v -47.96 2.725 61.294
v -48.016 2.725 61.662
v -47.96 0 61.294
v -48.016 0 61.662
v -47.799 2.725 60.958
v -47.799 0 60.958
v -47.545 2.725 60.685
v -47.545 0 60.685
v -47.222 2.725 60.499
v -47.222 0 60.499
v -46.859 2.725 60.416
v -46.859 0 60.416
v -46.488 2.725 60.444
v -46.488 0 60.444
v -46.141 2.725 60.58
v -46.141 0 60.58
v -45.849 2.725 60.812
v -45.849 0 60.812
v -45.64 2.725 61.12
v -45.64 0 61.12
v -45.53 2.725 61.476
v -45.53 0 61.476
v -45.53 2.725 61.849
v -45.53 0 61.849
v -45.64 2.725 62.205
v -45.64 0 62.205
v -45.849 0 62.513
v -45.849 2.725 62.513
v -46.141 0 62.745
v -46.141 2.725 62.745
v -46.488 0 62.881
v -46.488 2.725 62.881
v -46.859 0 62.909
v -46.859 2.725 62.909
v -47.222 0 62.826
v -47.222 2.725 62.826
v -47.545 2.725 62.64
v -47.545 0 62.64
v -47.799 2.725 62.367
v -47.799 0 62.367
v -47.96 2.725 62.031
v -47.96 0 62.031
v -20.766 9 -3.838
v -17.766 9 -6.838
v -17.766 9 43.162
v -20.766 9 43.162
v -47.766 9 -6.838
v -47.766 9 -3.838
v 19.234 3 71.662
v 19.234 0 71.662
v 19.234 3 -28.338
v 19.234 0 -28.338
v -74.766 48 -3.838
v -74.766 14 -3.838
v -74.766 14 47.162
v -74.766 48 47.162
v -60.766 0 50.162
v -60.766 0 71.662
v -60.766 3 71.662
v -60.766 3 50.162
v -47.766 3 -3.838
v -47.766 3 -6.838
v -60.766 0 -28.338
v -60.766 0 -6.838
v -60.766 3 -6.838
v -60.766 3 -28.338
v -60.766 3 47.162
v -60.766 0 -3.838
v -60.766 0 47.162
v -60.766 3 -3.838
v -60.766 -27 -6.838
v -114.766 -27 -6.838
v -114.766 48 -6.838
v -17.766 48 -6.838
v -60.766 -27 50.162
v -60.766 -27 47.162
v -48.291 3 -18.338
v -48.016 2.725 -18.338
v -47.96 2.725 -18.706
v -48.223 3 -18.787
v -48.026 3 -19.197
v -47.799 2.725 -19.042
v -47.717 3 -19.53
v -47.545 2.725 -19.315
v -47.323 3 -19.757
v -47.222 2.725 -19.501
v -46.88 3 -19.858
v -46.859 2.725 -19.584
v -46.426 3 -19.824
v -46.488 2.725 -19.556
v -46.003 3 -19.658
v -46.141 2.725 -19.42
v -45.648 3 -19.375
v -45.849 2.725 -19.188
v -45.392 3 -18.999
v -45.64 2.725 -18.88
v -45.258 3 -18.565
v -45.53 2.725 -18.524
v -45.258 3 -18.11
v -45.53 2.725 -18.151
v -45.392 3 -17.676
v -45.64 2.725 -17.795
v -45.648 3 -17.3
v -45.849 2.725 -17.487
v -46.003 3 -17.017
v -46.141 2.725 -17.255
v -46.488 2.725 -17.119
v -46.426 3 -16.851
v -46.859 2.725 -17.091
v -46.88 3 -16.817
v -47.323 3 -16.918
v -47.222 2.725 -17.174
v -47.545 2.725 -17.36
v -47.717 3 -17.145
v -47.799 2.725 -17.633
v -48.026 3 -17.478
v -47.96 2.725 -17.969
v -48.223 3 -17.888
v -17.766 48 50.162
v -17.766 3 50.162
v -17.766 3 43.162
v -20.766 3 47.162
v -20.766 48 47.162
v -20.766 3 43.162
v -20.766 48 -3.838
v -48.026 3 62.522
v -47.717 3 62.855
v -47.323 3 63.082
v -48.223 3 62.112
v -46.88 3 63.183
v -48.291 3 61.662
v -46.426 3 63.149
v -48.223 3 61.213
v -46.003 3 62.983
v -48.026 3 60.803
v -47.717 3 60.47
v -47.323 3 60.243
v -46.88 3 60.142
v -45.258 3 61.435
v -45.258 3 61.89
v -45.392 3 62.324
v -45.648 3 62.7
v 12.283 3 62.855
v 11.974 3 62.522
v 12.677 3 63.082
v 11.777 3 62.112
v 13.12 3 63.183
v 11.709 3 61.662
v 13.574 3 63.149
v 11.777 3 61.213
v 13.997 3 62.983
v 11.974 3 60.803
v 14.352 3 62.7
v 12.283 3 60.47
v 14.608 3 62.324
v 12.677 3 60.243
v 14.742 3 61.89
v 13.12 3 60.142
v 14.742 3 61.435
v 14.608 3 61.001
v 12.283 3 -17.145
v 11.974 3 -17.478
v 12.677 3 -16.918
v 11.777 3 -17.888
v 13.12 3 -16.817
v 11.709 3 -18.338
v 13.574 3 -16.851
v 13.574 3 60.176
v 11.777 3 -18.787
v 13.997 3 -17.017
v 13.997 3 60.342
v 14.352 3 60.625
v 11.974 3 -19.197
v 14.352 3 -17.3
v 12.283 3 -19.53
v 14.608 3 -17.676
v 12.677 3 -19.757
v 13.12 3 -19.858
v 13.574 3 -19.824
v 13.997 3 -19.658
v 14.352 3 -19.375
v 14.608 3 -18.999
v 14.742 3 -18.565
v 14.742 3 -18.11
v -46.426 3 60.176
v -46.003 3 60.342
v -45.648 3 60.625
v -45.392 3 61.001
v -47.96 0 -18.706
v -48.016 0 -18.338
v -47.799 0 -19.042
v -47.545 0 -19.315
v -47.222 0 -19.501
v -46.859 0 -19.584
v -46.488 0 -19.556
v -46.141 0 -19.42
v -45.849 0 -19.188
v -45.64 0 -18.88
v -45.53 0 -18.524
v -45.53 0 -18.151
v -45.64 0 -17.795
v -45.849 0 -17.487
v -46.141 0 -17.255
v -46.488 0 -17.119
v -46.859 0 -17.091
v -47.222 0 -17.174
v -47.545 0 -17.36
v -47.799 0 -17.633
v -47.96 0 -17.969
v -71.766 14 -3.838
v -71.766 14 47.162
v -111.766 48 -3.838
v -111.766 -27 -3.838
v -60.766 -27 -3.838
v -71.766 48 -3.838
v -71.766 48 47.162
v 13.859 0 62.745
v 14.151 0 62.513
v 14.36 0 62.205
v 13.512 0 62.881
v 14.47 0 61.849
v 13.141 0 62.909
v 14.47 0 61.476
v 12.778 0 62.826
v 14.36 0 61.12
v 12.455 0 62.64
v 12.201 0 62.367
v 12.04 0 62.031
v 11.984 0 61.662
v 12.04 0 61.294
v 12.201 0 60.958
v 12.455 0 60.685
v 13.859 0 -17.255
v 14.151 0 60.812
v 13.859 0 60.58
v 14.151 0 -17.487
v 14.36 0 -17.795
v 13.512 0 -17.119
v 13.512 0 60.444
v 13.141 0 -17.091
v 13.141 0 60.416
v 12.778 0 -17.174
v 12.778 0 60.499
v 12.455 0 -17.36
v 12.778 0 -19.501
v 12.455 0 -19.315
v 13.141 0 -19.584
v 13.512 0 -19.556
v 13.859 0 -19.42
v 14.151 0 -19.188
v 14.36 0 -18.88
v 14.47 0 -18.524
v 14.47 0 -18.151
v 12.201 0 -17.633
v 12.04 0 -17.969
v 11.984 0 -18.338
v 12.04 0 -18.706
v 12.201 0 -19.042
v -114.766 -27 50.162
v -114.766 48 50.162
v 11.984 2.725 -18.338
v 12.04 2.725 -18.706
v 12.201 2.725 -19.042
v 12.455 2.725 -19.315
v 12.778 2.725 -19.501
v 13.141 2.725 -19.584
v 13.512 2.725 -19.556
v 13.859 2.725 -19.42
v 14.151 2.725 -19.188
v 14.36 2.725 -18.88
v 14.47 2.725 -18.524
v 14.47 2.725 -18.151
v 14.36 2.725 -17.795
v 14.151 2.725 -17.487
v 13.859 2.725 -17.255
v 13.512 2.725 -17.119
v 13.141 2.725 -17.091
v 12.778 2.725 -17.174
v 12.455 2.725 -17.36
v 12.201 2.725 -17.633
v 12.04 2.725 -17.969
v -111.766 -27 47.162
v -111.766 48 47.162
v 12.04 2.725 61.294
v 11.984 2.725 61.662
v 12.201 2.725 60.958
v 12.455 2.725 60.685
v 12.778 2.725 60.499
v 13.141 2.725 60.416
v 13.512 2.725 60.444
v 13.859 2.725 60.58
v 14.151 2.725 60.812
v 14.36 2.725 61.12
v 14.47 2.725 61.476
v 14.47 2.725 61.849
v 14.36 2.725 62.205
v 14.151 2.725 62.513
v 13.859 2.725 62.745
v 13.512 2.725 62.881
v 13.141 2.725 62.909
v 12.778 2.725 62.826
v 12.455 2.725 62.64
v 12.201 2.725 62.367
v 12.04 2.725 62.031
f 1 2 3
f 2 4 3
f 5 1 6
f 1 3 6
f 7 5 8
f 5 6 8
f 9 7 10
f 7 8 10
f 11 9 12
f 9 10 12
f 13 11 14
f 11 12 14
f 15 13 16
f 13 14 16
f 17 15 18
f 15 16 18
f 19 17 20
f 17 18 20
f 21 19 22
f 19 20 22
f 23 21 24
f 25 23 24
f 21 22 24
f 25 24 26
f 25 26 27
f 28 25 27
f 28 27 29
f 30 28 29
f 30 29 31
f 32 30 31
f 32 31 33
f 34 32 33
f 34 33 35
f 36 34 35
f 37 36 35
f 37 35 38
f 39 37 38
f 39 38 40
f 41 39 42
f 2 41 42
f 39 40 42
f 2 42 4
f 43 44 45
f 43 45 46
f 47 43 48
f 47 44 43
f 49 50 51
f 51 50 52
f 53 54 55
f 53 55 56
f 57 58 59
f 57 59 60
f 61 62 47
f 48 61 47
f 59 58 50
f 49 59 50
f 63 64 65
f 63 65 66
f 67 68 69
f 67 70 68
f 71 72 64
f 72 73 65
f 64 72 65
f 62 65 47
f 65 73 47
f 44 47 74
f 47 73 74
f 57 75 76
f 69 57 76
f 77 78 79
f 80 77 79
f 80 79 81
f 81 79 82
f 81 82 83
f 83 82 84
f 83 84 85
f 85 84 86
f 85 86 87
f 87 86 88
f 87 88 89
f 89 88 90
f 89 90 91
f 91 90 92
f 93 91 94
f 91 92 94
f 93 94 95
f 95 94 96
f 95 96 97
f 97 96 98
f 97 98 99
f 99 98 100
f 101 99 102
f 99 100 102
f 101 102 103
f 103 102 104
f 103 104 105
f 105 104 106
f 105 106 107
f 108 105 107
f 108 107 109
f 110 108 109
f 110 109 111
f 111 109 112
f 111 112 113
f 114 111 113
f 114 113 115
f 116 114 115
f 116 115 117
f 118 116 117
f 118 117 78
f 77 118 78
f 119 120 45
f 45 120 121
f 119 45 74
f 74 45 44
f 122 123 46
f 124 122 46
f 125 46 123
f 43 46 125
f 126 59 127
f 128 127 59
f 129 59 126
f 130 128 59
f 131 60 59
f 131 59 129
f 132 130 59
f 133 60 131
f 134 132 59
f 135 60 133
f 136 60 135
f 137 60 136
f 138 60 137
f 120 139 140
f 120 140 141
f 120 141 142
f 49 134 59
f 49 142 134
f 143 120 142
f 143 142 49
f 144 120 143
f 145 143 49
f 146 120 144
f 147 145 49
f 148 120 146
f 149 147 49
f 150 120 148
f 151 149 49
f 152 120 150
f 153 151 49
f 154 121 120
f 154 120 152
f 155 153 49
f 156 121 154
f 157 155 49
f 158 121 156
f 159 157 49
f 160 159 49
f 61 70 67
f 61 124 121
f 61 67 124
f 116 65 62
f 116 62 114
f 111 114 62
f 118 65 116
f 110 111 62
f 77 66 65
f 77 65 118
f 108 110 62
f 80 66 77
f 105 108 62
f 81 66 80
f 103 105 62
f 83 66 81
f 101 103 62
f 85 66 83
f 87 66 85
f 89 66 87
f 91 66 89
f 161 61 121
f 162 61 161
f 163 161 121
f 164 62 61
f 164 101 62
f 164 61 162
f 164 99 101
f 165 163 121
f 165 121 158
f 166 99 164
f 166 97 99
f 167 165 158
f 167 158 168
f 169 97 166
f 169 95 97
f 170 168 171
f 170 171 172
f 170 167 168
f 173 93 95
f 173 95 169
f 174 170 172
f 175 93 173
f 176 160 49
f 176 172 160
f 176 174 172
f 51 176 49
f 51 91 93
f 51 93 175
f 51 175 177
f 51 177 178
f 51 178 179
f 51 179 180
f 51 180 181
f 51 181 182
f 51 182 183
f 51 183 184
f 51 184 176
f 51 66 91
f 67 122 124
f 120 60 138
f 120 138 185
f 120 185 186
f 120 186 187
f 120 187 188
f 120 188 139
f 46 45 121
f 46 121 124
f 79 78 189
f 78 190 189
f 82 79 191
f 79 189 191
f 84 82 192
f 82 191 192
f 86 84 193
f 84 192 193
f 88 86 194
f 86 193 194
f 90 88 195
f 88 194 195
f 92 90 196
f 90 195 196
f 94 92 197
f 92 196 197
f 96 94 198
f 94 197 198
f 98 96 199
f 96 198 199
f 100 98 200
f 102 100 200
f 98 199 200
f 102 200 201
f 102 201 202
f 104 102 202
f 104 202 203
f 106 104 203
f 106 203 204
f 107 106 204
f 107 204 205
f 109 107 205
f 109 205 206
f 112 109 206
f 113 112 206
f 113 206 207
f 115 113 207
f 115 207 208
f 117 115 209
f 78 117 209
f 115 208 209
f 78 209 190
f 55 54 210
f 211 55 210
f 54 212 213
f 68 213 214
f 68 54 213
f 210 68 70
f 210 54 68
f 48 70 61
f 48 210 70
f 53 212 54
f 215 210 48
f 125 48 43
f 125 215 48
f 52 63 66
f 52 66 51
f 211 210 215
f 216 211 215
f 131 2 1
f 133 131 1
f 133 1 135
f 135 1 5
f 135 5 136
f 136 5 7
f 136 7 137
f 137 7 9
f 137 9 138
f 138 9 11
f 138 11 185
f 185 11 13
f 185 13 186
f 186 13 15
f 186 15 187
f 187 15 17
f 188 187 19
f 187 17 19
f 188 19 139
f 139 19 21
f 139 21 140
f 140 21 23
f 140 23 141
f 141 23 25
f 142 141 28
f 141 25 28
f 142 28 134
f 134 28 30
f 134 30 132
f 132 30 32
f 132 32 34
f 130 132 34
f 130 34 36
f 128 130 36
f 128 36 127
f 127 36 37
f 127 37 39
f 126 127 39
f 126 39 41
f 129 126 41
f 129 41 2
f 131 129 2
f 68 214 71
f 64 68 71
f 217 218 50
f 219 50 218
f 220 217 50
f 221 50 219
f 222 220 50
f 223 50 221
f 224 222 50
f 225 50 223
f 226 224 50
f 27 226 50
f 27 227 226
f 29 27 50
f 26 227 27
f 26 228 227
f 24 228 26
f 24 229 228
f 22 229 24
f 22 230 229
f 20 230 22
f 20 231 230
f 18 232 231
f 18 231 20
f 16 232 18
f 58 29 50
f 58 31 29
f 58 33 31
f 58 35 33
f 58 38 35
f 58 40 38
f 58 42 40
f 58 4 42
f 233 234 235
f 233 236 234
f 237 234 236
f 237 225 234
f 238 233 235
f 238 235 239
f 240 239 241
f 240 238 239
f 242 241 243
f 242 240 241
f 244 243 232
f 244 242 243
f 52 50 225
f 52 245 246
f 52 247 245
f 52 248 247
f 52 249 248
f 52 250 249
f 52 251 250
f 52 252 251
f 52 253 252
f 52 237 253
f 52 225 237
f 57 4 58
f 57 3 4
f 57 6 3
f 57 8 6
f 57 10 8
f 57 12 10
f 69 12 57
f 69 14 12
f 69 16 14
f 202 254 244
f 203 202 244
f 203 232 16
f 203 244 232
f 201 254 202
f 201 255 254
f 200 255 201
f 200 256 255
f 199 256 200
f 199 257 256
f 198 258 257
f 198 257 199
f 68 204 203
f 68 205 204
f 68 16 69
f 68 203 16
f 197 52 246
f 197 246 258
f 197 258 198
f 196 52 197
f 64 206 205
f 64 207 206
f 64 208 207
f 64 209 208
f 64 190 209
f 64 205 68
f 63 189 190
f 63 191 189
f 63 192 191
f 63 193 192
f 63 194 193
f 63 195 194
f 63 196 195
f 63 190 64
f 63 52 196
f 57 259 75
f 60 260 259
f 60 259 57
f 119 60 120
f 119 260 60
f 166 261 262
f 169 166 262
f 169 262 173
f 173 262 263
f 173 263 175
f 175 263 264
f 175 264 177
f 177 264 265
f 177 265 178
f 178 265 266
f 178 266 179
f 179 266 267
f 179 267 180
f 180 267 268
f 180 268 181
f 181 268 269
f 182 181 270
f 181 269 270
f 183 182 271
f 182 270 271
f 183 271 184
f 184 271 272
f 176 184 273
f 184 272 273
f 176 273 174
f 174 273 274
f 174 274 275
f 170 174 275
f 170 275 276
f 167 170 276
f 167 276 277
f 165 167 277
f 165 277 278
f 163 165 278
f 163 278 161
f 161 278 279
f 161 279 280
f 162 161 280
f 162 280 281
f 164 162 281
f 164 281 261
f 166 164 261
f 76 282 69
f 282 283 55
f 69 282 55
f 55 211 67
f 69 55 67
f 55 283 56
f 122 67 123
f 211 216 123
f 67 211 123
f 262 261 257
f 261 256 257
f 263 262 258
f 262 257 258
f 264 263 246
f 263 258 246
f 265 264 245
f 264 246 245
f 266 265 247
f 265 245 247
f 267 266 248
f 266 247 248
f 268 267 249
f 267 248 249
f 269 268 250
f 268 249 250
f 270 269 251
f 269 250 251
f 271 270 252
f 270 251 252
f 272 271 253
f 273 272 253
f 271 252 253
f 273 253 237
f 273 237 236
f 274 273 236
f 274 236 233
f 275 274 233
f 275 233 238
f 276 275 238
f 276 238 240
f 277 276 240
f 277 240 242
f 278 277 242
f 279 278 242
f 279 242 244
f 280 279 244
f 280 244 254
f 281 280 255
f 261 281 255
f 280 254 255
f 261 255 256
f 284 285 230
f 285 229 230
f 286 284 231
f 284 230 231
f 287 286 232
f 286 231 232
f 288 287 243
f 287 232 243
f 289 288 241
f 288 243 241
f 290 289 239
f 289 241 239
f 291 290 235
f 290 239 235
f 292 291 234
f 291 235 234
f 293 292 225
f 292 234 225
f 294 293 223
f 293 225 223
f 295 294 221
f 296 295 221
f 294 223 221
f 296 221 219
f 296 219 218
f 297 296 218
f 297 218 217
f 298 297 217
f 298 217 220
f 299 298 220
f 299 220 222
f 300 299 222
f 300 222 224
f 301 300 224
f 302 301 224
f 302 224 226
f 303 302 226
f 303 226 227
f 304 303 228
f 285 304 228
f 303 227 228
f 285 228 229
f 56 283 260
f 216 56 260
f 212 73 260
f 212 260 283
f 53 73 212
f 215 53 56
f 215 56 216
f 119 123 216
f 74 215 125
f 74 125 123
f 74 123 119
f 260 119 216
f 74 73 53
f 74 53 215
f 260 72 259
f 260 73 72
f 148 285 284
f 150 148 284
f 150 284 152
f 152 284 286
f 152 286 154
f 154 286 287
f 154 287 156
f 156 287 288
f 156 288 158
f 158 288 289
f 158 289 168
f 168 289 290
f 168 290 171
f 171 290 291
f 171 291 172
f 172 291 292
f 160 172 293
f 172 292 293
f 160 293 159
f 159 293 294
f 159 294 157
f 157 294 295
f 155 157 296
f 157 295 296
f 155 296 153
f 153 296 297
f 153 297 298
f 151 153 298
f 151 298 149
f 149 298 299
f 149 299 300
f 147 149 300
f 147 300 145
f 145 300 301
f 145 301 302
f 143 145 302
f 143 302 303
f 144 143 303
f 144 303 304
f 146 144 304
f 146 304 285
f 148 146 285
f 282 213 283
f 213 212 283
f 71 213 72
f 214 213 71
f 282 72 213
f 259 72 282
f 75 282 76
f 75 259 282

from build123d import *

# Parameters (mm, degrees)
SKETCH_1_W                   = 80
SKETCH_1_H                   = 100
EXTRUDE_1_DEPTH              = 3
SKETCH_2_W                   = 97
SKETCH_2_H                   = 57
SKETCH_2_W_2                 = 91
SKETCH_2_H_2                 = 51
EXTRUDE_2_DEPTH              = 45
SKETCH_3_W                   = 3
SKETCH_3_H                   = 34
EXTRUDE_3_DEPTH              = 51
SKETCH_4_W                   = 30
SKETCH_4_H                   = 6
CUT_EXTRUDE_2_DEPTH          = 50
SKETCH_5_W                   = 57
SKETCH_5_H                   = 57
SKETCH_5_W_2                 = 51
SKETCH_5_H_2                 = 51
EXTRUDE_4_DEPTH              = 30
HOLE_WIZARD_M3_1_D           = 2.5
HOLE_WIZARD_M3_1_CSINK_D     = 3.05
HOLE_WIZARD_M3_1_CSINK_ANGLE = 90
SKETCH_9_W                   = 3
SKETCH_9_H                   = 57
CUT_EXTRUDE_3_DEPTH          = 27


with BuildPart() as part:
    # 草图1 → 凸台-拉伸1 (new body)
    with BuildSketch(Plane(origin=(0, 0, 0), x_dir=(1, 0, 0), z_dir=(0, 1, 0))):
        with Locations((-20.765734509, -21.662442769)):
            Rectangle(SKETCH_1_W, SKETCH_1_H)
    extrude(amount=EXTRUDE_1_DEPTH)

    # 草图2 → 凸台-拉伸2 (add)
    with BuildSketch(Plane(origin=(0, 3, 0), x_dir=(1, 0, 0), z_dir=(0, 1, 0))):
        with Locations((-66.265734509, -21.662442769)):
            Rectangle(SKETCH_2_W, SKETCH_2_H)
        with Locations((-66.265734509, -21.662442769)):
            Rectangle(SKETCH_2_W_2, SKETCH_2_H_2, mode=Mode.SUBTRACT)
    extrude(amount=EXTRUDE_2_DEPTH)

    # 草图3 → 凸台-拉伸3 (add)
    with BuildSketch(Plane.XY.offset(-3.837557231)):
        with Locations((-73.265734509, 31)):
            Rectangle(SKETCH_3_W, SKETCH_3_H)
    extrude(amount=EXTRUDE_3_DEPTH)

    # 草图4 → 切除-拉伸2 (cut)
    with BuildSketch(Plane(origin=(0, 0, -6.837557231), x_dir=(-1, 0, 0), z_dir=(0, 0, -1))):
        with Locations((32.765734509, 6)):
            Rectangle(SKETCH_4_W, SKETCH_4_H)
    extrude(amount=-CUT_EXTRUDE_2_DEPTH, mode=Mode.SUBTRACT)

    # 草图5 → 凸台-拉伸4 (add)
    with BuildSketch(Plane.XZ.offset(-3)):
        with Locations((-86.265734509, 21.662442769)):
            Rectangle(SKETCH_5_W, SKETCH_5_H)
        with Locations((-86.265734509, 21.662442769)):
            Rectangle(SKETCH_5_W_2, SKETCH_5_H_2, mode=Mode.SUBTRACT)
    extrude(amount=EXTRUDE_4_DEPTH)

    # M3 螺纹孔1 (through all)
    with Locations(Plane(origin=(0, 3, 0), x_dir=(1, 0, 0), z_dir=(0, 1, 0))):
        with Locations((-46.765734509, 18.337557231), (13.234265491, 18.337557231), (13.234265491, -61.662442769), (-46.765734509, -61.662442769)):
            CounterSinkHole(HOLE_WIZARD_M3_1_D / 2, HOLE_WIZARD_M3_1_CSINK_D / 2, counter_sink_angle=HOLE_WIZARD_M3_1_CSINK_ANGLE)

    # 草图9 → 切除-拉伸3 (cut)
    with BuildSketch(Plane(origin=(0, -27, 0), x_dir=(-1, 0, 0), z_dir=(0, -1, 0))):
        with Locations((59.265734509, -21.662442769)):
            Rectangle(SKETCH_9_W, SKETCH_9_H)
    extrude(amount=-CUT_EXTRUDE_3_DEPTH, mode=Mode.SUBTRACT)


solid = part.part
